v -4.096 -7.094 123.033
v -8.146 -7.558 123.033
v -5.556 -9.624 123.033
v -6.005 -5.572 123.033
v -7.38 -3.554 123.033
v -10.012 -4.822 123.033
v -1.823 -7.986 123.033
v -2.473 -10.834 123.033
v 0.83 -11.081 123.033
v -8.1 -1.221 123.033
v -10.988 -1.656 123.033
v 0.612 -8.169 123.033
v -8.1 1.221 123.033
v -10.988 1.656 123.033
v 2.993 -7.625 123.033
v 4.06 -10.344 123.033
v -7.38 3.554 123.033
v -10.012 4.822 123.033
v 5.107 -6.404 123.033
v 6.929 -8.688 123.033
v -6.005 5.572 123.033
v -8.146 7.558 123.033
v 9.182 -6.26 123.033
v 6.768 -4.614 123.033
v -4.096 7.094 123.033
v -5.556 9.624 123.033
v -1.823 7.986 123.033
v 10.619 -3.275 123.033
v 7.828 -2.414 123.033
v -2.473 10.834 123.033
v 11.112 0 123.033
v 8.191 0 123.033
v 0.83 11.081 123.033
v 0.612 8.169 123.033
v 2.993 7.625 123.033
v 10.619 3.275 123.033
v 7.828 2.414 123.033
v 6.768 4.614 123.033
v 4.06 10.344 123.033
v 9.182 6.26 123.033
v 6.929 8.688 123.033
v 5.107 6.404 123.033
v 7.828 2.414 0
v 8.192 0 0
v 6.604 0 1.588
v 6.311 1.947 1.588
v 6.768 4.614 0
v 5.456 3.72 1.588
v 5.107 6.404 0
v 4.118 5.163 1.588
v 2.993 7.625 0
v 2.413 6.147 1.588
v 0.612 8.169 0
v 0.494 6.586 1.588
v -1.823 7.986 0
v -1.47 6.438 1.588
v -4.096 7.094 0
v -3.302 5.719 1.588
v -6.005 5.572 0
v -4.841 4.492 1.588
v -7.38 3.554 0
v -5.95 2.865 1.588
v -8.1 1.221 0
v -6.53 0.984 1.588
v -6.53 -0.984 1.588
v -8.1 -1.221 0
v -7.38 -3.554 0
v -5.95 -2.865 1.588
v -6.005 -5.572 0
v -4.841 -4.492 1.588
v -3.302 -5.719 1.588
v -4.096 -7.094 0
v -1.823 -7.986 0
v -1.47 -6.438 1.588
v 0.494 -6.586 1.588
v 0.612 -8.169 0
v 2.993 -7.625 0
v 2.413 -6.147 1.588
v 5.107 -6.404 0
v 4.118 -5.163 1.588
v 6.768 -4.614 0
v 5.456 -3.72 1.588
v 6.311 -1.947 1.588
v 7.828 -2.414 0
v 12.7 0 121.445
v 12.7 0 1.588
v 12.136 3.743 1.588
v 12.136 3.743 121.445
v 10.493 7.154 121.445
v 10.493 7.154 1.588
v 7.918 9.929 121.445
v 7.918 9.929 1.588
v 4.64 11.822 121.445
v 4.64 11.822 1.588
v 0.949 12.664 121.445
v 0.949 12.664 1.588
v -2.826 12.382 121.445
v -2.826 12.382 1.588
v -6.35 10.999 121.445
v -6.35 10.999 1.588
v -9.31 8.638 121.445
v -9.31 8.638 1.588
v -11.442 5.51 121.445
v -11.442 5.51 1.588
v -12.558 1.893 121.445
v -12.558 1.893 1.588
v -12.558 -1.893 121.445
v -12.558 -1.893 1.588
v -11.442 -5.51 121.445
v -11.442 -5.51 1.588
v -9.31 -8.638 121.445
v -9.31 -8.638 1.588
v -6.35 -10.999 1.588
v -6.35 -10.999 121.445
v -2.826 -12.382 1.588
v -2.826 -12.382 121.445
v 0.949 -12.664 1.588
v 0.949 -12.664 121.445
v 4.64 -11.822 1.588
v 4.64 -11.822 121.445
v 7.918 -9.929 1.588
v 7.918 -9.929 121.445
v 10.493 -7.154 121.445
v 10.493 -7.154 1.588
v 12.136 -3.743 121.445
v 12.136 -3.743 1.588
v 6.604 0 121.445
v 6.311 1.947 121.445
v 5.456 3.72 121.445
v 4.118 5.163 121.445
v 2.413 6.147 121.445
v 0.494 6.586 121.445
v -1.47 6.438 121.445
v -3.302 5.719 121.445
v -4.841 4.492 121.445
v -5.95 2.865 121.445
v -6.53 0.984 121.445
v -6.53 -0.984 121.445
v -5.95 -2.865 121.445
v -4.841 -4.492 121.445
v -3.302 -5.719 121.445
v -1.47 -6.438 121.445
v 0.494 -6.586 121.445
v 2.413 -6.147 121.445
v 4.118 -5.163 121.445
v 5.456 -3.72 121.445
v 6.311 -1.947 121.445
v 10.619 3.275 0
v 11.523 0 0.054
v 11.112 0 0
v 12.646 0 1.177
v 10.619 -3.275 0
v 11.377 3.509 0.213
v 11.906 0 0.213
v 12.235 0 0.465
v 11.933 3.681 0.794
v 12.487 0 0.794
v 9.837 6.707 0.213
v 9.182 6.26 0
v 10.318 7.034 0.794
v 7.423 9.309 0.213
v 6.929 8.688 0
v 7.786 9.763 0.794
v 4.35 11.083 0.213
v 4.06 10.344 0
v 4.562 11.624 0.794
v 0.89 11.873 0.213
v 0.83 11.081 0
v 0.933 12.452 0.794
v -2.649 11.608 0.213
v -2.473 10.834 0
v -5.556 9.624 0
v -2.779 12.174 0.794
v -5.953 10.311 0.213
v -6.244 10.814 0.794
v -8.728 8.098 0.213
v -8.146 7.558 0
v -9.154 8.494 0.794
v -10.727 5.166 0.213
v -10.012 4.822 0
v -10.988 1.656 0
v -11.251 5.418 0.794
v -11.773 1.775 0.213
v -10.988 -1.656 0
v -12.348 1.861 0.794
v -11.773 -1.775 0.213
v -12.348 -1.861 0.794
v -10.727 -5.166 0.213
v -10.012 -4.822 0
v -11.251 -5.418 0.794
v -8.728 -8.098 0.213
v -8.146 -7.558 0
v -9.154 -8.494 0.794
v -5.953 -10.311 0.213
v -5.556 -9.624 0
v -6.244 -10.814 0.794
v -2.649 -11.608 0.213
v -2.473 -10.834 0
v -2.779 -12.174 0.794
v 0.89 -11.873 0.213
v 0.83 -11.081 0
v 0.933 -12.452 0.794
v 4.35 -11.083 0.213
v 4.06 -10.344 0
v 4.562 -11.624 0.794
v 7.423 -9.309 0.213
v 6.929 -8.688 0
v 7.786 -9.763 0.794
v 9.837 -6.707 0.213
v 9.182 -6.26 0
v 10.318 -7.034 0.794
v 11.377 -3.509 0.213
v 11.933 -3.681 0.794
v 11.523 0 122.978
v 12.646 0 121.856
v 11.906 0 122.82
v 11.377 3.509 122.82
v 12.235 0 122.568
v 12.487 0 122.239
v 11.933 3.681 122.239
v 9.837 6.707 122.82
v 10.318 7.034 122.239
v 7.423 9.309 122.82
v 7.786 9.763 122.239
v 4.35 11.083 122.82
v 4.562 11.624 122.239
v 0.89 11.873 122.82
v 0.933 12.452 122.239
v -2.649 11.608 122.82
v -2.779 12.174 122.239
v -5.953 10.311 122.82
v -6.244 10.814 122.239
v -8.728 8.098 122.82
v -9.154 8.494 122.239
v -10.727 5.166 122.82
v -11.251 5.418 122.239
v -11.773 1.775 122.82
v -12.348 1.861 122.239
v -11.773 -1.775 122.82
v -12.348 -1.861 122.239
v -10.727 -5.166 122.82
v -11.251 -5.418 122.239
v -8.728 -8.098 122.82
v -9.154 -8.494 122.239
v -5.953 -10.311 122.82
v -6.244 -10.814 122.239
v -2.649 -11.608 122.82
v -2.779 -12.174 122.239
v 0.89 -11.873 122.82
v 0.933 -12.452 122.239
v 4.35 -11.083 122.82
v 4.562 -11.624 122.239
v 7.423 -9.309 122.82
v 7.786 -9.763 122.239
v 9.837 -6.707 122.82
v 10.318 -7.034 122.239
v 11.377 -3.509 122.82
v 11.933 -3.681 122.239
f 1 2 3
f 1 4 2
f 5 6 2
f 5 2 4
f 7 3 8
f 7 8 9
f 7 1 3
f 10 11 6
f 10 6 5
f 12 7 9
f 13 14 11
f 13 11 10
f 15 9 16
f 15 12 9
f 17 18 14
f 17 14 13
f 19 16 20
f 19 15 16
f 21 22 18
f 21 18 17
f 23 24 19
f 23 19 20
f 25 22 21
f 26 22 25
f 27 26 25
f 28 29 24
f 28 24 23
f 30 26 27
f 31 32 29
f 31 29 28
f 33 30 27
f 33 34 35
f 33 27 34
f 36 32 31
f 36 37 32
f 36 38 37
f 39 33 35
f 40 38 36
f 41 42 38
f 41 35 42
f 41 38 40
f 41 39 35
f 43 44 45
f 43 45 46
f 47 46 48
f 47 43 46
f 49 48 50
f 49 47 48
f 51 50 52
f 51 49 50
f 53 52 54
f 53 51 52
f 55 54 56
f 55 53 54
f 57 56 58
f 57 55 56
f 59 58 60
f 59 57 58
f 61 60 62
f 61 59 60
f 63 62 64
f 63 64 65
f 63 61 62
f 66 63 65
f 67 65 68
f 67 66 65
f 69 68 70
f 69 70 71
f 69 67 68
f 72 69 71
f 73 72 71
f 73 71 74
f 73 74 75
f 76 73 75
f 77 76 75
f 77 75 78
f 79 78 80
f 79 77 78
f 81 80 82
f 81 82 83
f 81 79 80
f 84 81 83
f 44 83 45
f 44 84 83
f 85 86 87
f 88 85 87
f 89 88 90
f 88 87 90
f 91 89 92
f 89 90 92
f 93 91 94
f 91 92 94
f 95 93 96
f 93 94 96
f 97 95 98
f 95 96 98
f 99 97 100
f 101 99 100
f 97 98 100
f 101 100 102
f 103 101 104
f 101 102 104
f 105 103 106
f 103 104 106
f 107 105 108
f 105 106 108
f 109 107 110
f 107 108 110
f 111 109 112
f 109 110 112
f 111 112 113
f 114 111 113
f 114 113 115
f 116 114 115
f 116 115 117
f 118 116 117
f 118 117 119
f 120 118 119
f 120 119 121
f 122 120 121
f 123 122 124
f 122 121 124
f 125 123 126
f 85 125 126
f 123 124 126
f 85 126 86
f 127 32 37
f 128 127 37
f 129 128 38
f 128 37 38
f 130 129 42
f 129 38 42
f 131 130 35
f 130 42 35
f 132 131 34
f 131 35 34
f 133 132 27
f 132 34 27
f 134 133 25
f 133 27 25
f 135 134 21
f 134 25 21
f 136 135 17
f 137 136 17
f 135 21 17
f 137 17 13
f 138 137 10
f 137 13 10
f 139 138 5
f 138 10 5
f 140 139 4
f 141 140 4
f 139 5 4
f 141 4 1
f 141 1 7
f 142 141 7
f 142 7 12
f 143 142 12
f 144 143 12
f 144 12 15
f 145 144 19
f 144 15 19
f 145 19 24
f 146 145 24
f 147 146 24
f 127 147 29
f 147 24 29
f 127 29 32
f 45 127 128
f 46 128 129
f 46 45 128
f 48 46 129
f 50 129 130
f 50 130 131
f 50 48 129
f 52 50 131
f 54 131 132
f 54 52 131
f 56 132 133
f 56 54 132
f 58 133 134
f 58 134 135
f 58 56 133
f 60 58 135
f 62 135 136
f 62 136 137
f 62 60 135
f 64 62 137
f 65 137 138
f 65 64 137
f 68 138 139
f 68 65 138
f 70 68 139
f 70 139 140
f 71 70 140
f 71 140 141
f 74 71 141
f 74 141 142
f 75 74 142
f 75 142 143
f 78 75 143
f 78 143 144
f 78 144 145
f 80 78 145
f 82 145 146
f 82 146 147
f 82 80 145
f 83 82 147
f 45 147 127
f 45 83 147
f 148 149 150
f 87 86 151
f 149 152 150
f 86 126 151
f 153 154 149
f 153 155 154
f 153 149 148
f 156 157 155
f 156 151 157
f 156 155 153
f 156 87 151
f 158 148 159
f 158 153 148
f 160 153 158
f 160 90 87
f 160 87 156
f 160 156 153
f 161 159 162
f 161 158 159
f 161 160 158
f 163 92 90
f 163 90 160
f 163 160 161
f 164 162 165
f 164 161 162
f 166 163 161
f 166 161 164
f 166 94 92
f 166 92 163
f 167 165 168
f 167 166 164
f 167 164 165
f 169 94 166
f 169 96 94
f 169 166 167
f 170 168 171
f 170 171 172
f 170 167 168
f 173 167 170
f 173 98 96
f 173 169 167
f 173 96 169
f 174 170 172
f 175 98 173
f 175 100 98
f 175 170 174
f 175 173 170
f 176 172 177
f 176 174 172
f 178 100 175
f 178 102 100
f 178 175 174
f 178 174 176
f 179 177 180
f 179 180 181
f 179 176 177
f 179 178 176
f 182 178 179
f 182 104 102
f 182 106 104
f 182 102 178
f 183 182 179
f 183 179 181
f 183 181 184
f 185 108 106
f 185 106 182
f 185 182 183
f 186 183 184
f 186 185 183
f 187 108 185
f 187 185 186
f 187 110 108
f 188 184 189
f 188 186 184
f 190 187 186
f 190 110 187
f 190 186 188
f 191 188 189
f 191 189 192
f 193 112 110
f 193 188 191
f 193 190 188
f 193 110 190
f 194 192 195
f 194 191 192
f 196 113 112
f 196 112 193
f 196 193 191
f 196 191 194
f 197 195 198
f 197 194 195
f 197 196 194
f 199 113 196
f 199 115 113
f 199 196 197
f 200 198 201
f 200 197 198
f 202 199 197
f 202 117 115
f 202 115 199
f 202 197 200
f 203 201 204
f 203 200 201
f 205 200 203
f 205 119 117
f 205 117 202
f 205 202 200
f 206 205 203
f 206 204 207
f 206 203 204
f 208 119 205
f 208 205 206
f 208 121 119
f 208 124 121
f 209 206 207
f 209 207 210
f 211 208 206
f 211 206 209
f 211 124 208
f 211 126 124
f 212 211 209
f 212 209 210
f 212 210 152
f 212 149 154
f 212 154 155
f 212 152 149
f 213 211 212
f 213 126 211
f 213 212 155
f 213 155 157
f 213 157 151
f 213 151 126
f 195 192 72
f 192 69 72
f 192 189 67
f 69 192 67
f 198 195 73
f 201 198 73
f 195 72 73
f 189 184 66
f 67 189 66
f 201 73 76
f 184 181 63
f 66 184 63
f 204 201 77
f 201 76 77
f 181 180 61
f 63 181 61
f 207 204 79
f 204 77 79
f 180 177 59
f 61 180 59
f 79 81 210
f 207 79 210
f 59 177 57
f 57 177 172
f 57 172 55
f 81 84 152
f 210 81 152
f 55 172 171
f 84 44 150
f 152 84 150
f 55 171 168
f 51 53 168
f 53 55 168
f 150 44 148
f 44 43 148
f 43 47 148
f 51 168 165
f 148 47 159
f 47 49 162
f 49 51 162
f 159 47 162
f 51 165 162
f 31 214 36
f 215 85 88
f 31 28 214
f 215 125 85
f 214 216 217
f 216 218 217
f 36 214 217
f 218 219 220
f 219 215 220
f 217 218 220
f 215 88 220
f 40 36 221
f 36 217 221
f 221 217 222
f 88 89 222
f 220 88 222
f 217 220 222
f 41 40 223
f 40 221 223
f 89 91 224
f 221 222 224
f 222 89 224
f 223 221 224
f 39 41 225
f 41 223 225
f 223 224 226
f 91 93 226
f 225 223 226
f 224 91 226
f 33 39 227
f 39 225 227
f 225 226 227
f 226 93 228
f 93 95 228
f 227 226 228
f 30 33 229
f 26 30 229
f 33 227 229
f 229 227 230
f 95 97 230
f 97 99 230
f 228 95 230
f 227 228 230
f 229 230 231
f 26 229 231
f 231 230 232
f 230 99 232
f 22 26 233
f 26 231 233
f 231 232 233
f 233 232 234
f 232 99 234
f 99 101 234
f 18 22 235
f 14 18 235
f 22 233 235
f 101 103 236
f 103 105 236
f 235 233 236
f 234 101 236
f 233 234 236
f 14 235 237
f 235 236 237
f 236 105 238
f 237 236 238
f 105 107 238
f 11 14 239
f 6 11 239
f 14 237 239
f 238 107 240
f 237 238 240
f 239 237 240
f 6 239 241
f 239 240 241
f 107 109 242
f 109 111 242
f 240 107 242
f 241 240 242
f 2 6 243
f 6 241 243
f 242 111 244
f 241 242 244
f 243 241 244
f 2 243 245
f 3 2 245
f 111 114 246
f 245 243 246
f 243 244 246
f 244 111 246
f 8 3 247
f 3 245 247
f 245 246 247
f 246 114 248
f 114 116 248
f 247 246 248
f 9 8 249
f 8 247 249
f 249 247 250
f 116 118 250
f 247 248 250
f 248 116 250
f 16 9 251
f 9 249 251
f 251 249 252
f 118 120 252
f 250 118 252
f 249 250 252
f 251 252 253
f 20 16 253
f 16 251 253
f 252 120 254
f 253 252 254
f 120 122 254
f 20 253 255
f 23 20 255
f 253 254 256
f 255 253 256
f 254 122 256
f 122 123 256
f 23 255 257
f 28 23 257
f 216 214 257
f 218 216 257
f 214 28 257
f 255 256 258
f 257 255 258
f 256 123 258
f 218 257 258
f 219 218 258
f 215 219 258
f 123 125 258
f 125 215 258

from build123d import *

# Parameters (mm, degrees)
F0_R     = 12.7
F0_R_2   = 6.604
F1_DEPTH = 123.03252
F2_SIZE  = 1.5875
F3_R     = 1.5875


with BuildPart() as f1:
    # F0 (on Top) → F1 (new body)
    with BuildSketch(Plane.XY):
        Circle(F0_R)
        Circle(F0_R_2, mode=Mode.SUBTRACT)
    extrude(amount=F1_DEPTH)

    # F2
    f2_edges = [f1.edges().sort_by_distance(p)[0] for p in [
        (6.604, 0, 61.51626),
        (-6.604, 0, 0),
        (-6.604, 0, 123.03252),
    ]]
    chamfer(f2_edges, length=F2_SIZE)

    # F3
    f3_edges = [f1.edges().sort_by_distance(p)[0] for p in [
        (12.7, 0, 61.51626),
        (-12.7, 0, 0),
        (-12.7, 0, 123.03252),
    ]]
    fillet(f3_edges, radius=F3_R)


solid = f1.part
